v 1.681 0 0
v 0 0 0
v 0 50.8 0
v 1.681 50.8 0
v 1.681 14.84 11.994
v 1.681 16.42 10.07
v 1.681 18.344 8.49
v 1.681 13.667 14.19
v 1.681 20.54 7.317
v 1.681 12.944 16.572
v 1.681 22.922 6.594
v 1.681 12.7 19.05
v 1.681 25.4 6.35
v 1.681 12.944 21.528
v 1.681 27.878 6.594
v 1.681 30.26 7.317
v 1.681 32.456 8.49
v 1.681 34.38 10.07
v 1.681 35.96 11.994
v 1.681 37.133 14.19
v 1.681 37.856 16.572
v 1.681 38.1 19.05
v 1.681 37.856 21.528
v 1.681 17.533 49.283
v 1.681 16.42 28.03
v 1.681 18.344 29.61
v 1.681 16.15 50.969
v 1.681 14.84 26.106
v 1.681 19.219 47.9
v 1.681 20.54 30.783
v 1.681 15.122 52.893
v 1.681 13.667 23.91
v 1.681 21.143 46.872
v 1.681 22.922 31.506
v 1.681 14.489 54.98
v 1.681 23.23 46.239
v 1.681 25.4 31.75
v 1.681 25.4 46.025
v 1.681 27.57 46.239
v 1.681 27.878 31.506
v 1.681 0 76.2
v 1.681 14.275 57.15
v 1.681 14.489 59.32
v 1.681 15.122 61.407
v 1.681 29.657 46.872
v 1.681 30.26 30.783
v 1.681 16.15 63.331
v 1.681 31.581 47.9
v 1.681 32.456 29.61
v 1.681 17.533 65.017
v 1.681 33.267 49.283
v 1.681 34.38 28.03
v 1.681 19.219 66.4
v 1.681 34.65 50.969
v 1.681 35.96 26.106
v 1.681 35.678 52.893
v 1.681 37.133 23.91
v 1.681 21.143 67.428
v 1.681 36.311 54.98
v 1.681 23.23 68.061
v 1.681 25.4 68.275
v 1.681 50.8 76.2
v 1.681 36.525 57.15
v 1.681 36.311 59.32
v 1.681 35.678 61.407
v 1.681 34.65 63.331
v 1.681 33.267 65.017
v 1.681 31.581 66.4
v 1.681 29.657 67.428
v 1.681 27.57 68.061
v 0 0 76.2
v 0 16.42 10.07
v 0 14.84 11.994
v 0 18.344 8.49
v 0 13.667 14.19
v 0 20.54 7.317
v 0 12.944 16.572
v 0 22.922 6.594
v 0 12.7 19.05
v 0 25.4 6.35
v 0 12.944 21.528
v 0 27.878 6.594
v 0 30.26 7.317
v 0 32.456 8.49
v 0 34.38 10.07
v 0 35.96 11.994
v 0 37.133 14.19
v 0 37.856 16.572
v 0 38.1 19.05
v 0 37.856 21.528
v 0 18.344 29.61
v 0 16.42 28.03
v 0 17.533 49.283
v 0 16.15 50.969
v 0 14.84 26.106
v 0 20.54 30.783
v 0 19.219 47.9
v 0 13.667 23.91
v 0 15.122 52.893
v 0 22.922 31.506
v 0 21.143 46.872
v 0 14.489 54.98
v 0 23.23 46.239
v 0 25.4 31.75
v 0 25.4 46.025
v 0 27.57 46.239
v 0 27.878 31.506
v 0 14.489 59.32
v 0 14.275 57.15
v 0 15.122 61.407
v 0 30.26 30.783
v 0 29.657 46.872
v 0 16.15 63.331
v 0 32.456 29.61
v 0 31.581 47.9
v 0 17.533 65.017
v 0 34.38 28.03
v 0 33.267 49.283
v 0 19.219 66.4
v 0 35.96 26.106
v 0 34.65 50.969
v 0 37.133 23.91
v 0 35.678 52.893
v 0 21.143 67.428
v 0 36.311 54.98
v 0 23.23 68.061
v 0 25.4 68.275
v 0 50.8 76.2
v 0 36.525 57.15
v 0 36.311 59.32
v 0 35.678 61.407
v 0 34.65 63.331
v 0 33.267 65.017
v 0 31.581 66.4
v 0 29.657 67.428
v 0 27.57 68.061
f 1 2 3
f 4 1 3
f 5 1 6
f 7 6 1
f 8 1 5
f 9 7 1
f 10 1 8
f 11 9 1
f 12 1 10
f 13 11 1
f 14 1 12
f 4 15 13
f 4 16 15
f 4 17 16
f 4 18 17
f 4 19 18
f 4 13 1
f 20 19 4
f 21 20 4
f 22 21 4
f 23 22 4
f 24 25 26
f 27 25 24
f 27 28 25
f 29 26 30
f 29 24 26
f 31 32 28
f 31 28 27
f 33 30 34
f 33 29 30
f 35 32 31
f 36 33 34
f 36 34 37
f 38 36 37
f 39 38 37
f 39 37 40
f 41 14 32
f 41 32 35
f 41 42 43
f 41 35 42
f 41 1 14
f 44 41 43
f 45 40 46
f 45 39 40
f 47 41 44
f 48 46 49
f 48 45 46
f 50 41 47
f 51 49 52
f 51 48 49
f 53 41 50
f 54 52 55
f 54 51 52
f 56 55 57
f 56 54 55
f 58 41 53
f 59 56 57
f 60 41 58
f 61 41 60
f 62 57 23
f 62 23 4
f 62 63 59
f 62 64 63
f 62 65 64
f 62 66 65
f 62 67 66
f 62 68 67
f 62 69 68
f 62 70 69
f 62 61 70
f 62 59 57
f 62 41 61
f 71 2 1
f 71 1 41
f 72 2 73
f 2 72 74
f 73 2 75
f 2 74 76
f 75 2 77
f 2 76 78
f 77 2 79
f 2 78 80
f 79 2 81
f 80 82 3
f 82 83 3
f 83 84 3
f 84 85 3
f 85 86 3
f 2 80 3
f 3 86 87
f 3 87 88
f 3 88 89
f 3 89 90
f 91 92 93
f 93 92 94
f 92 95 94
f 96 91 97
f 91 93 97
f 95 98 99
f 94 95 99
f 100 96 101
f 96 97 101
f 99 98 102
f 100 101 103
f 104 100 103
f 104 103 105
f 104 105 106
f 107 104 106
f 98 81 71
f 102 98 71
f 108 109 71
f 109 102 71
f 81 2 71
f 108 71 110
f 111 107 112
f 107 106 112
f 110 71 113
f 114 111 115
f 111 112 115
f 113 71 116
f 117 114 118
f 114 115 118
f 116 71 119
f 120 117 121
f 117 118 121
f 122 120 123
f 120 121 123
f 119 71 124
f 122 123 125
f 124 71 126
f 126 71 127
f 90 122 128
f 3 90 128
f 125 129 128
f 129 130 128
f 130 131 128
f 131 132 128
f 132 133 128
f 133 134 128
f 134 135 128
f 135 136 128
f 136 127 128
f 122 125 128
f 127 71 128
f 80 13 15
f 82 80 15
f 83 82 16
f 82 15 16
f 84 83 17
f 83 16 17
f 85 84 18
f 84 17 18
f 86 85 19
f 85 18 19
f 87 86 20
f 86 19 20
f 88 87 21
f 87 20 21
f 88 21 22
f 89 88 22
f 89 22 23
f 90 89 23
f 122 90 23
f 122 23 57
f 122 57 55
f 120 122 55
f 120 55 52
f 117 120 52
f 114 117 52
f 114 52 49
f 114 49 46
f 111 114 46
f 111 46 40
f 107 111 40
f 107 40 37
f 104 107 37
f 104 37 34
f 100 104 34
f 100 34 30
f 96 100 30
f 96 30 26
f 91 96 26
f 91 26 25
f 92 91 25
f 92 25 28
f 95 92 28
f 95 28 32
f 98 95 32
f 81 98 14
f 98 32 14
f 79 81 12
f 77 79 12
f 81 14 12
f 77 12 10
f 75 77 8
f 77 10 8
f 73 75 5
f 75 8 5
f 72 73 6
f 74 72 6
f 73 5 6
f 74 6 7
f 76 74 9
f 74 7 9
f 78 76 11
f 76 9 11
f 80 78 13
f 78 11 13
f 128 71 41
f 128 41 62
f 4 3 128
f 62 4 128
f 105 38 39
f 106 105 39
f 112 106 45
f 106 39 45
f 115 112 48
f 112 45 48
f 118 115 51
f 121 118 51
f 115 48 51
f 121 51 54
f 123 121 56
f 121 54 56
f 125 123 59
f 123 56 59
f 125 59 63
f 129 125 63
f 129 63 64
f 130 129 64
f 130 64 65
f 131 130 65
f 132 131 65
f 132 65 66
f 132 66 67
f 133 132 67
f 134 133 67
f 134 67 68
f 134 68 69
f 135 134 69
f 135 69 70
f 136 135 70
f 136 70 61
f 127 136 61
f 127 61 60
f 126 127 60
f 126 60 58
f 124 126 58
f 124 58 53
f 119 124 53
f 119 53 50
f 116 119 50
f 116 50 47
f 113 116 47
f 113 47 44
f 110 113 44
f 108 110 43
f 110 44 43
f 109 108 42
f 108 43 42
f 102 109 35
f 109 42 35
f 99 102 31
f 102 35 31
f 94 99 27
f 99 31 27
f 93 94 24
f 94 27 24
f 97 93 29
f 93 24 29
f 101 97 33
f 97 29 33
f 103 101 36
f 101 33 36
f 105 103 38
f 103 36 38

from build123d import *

# Parameters (mm, degrees)
SKETCH1_W           = 50.8
SKETCH1_H           = 76.2
BOSS_EXTRUDE1_DEPTH = 1.681219215
SKETCH3_R           = 11.1252
SKETCH3_R_2         = 12.7
CUT_EXTRUDE1_DEPTH  = 92.59643278


with BuildPart() as part:
    # Sketch1 → Boss-Extrude1 (new body)
    with BuildSketch(Plane.YZ):
        with Locations((25.4, 38.1)):
            Rectangle(SKETCH1_W, SKETCH1_H)
    extrude(amount=BOSS_EXTRUDE1_DEPTH)

    # Sketch3 → Cut-Extrude1 (cut, through all)
    with BuildSketch(Plane.YZ.offset(1.681219215)):
        with Locations(Location((25.4, 57.15, 0), (0, 0, 270))):
            Circle(SKETCH3_R)
        with Locations(Location((25.4, 19.05, 0), (0, 0, 270))):
            Circle(SKETCH3_R_2)
    extrude(amount=-CUT_EXTRUDE1_DEPTH, mode=Mode.SUBTRACT)


solid = part.part
